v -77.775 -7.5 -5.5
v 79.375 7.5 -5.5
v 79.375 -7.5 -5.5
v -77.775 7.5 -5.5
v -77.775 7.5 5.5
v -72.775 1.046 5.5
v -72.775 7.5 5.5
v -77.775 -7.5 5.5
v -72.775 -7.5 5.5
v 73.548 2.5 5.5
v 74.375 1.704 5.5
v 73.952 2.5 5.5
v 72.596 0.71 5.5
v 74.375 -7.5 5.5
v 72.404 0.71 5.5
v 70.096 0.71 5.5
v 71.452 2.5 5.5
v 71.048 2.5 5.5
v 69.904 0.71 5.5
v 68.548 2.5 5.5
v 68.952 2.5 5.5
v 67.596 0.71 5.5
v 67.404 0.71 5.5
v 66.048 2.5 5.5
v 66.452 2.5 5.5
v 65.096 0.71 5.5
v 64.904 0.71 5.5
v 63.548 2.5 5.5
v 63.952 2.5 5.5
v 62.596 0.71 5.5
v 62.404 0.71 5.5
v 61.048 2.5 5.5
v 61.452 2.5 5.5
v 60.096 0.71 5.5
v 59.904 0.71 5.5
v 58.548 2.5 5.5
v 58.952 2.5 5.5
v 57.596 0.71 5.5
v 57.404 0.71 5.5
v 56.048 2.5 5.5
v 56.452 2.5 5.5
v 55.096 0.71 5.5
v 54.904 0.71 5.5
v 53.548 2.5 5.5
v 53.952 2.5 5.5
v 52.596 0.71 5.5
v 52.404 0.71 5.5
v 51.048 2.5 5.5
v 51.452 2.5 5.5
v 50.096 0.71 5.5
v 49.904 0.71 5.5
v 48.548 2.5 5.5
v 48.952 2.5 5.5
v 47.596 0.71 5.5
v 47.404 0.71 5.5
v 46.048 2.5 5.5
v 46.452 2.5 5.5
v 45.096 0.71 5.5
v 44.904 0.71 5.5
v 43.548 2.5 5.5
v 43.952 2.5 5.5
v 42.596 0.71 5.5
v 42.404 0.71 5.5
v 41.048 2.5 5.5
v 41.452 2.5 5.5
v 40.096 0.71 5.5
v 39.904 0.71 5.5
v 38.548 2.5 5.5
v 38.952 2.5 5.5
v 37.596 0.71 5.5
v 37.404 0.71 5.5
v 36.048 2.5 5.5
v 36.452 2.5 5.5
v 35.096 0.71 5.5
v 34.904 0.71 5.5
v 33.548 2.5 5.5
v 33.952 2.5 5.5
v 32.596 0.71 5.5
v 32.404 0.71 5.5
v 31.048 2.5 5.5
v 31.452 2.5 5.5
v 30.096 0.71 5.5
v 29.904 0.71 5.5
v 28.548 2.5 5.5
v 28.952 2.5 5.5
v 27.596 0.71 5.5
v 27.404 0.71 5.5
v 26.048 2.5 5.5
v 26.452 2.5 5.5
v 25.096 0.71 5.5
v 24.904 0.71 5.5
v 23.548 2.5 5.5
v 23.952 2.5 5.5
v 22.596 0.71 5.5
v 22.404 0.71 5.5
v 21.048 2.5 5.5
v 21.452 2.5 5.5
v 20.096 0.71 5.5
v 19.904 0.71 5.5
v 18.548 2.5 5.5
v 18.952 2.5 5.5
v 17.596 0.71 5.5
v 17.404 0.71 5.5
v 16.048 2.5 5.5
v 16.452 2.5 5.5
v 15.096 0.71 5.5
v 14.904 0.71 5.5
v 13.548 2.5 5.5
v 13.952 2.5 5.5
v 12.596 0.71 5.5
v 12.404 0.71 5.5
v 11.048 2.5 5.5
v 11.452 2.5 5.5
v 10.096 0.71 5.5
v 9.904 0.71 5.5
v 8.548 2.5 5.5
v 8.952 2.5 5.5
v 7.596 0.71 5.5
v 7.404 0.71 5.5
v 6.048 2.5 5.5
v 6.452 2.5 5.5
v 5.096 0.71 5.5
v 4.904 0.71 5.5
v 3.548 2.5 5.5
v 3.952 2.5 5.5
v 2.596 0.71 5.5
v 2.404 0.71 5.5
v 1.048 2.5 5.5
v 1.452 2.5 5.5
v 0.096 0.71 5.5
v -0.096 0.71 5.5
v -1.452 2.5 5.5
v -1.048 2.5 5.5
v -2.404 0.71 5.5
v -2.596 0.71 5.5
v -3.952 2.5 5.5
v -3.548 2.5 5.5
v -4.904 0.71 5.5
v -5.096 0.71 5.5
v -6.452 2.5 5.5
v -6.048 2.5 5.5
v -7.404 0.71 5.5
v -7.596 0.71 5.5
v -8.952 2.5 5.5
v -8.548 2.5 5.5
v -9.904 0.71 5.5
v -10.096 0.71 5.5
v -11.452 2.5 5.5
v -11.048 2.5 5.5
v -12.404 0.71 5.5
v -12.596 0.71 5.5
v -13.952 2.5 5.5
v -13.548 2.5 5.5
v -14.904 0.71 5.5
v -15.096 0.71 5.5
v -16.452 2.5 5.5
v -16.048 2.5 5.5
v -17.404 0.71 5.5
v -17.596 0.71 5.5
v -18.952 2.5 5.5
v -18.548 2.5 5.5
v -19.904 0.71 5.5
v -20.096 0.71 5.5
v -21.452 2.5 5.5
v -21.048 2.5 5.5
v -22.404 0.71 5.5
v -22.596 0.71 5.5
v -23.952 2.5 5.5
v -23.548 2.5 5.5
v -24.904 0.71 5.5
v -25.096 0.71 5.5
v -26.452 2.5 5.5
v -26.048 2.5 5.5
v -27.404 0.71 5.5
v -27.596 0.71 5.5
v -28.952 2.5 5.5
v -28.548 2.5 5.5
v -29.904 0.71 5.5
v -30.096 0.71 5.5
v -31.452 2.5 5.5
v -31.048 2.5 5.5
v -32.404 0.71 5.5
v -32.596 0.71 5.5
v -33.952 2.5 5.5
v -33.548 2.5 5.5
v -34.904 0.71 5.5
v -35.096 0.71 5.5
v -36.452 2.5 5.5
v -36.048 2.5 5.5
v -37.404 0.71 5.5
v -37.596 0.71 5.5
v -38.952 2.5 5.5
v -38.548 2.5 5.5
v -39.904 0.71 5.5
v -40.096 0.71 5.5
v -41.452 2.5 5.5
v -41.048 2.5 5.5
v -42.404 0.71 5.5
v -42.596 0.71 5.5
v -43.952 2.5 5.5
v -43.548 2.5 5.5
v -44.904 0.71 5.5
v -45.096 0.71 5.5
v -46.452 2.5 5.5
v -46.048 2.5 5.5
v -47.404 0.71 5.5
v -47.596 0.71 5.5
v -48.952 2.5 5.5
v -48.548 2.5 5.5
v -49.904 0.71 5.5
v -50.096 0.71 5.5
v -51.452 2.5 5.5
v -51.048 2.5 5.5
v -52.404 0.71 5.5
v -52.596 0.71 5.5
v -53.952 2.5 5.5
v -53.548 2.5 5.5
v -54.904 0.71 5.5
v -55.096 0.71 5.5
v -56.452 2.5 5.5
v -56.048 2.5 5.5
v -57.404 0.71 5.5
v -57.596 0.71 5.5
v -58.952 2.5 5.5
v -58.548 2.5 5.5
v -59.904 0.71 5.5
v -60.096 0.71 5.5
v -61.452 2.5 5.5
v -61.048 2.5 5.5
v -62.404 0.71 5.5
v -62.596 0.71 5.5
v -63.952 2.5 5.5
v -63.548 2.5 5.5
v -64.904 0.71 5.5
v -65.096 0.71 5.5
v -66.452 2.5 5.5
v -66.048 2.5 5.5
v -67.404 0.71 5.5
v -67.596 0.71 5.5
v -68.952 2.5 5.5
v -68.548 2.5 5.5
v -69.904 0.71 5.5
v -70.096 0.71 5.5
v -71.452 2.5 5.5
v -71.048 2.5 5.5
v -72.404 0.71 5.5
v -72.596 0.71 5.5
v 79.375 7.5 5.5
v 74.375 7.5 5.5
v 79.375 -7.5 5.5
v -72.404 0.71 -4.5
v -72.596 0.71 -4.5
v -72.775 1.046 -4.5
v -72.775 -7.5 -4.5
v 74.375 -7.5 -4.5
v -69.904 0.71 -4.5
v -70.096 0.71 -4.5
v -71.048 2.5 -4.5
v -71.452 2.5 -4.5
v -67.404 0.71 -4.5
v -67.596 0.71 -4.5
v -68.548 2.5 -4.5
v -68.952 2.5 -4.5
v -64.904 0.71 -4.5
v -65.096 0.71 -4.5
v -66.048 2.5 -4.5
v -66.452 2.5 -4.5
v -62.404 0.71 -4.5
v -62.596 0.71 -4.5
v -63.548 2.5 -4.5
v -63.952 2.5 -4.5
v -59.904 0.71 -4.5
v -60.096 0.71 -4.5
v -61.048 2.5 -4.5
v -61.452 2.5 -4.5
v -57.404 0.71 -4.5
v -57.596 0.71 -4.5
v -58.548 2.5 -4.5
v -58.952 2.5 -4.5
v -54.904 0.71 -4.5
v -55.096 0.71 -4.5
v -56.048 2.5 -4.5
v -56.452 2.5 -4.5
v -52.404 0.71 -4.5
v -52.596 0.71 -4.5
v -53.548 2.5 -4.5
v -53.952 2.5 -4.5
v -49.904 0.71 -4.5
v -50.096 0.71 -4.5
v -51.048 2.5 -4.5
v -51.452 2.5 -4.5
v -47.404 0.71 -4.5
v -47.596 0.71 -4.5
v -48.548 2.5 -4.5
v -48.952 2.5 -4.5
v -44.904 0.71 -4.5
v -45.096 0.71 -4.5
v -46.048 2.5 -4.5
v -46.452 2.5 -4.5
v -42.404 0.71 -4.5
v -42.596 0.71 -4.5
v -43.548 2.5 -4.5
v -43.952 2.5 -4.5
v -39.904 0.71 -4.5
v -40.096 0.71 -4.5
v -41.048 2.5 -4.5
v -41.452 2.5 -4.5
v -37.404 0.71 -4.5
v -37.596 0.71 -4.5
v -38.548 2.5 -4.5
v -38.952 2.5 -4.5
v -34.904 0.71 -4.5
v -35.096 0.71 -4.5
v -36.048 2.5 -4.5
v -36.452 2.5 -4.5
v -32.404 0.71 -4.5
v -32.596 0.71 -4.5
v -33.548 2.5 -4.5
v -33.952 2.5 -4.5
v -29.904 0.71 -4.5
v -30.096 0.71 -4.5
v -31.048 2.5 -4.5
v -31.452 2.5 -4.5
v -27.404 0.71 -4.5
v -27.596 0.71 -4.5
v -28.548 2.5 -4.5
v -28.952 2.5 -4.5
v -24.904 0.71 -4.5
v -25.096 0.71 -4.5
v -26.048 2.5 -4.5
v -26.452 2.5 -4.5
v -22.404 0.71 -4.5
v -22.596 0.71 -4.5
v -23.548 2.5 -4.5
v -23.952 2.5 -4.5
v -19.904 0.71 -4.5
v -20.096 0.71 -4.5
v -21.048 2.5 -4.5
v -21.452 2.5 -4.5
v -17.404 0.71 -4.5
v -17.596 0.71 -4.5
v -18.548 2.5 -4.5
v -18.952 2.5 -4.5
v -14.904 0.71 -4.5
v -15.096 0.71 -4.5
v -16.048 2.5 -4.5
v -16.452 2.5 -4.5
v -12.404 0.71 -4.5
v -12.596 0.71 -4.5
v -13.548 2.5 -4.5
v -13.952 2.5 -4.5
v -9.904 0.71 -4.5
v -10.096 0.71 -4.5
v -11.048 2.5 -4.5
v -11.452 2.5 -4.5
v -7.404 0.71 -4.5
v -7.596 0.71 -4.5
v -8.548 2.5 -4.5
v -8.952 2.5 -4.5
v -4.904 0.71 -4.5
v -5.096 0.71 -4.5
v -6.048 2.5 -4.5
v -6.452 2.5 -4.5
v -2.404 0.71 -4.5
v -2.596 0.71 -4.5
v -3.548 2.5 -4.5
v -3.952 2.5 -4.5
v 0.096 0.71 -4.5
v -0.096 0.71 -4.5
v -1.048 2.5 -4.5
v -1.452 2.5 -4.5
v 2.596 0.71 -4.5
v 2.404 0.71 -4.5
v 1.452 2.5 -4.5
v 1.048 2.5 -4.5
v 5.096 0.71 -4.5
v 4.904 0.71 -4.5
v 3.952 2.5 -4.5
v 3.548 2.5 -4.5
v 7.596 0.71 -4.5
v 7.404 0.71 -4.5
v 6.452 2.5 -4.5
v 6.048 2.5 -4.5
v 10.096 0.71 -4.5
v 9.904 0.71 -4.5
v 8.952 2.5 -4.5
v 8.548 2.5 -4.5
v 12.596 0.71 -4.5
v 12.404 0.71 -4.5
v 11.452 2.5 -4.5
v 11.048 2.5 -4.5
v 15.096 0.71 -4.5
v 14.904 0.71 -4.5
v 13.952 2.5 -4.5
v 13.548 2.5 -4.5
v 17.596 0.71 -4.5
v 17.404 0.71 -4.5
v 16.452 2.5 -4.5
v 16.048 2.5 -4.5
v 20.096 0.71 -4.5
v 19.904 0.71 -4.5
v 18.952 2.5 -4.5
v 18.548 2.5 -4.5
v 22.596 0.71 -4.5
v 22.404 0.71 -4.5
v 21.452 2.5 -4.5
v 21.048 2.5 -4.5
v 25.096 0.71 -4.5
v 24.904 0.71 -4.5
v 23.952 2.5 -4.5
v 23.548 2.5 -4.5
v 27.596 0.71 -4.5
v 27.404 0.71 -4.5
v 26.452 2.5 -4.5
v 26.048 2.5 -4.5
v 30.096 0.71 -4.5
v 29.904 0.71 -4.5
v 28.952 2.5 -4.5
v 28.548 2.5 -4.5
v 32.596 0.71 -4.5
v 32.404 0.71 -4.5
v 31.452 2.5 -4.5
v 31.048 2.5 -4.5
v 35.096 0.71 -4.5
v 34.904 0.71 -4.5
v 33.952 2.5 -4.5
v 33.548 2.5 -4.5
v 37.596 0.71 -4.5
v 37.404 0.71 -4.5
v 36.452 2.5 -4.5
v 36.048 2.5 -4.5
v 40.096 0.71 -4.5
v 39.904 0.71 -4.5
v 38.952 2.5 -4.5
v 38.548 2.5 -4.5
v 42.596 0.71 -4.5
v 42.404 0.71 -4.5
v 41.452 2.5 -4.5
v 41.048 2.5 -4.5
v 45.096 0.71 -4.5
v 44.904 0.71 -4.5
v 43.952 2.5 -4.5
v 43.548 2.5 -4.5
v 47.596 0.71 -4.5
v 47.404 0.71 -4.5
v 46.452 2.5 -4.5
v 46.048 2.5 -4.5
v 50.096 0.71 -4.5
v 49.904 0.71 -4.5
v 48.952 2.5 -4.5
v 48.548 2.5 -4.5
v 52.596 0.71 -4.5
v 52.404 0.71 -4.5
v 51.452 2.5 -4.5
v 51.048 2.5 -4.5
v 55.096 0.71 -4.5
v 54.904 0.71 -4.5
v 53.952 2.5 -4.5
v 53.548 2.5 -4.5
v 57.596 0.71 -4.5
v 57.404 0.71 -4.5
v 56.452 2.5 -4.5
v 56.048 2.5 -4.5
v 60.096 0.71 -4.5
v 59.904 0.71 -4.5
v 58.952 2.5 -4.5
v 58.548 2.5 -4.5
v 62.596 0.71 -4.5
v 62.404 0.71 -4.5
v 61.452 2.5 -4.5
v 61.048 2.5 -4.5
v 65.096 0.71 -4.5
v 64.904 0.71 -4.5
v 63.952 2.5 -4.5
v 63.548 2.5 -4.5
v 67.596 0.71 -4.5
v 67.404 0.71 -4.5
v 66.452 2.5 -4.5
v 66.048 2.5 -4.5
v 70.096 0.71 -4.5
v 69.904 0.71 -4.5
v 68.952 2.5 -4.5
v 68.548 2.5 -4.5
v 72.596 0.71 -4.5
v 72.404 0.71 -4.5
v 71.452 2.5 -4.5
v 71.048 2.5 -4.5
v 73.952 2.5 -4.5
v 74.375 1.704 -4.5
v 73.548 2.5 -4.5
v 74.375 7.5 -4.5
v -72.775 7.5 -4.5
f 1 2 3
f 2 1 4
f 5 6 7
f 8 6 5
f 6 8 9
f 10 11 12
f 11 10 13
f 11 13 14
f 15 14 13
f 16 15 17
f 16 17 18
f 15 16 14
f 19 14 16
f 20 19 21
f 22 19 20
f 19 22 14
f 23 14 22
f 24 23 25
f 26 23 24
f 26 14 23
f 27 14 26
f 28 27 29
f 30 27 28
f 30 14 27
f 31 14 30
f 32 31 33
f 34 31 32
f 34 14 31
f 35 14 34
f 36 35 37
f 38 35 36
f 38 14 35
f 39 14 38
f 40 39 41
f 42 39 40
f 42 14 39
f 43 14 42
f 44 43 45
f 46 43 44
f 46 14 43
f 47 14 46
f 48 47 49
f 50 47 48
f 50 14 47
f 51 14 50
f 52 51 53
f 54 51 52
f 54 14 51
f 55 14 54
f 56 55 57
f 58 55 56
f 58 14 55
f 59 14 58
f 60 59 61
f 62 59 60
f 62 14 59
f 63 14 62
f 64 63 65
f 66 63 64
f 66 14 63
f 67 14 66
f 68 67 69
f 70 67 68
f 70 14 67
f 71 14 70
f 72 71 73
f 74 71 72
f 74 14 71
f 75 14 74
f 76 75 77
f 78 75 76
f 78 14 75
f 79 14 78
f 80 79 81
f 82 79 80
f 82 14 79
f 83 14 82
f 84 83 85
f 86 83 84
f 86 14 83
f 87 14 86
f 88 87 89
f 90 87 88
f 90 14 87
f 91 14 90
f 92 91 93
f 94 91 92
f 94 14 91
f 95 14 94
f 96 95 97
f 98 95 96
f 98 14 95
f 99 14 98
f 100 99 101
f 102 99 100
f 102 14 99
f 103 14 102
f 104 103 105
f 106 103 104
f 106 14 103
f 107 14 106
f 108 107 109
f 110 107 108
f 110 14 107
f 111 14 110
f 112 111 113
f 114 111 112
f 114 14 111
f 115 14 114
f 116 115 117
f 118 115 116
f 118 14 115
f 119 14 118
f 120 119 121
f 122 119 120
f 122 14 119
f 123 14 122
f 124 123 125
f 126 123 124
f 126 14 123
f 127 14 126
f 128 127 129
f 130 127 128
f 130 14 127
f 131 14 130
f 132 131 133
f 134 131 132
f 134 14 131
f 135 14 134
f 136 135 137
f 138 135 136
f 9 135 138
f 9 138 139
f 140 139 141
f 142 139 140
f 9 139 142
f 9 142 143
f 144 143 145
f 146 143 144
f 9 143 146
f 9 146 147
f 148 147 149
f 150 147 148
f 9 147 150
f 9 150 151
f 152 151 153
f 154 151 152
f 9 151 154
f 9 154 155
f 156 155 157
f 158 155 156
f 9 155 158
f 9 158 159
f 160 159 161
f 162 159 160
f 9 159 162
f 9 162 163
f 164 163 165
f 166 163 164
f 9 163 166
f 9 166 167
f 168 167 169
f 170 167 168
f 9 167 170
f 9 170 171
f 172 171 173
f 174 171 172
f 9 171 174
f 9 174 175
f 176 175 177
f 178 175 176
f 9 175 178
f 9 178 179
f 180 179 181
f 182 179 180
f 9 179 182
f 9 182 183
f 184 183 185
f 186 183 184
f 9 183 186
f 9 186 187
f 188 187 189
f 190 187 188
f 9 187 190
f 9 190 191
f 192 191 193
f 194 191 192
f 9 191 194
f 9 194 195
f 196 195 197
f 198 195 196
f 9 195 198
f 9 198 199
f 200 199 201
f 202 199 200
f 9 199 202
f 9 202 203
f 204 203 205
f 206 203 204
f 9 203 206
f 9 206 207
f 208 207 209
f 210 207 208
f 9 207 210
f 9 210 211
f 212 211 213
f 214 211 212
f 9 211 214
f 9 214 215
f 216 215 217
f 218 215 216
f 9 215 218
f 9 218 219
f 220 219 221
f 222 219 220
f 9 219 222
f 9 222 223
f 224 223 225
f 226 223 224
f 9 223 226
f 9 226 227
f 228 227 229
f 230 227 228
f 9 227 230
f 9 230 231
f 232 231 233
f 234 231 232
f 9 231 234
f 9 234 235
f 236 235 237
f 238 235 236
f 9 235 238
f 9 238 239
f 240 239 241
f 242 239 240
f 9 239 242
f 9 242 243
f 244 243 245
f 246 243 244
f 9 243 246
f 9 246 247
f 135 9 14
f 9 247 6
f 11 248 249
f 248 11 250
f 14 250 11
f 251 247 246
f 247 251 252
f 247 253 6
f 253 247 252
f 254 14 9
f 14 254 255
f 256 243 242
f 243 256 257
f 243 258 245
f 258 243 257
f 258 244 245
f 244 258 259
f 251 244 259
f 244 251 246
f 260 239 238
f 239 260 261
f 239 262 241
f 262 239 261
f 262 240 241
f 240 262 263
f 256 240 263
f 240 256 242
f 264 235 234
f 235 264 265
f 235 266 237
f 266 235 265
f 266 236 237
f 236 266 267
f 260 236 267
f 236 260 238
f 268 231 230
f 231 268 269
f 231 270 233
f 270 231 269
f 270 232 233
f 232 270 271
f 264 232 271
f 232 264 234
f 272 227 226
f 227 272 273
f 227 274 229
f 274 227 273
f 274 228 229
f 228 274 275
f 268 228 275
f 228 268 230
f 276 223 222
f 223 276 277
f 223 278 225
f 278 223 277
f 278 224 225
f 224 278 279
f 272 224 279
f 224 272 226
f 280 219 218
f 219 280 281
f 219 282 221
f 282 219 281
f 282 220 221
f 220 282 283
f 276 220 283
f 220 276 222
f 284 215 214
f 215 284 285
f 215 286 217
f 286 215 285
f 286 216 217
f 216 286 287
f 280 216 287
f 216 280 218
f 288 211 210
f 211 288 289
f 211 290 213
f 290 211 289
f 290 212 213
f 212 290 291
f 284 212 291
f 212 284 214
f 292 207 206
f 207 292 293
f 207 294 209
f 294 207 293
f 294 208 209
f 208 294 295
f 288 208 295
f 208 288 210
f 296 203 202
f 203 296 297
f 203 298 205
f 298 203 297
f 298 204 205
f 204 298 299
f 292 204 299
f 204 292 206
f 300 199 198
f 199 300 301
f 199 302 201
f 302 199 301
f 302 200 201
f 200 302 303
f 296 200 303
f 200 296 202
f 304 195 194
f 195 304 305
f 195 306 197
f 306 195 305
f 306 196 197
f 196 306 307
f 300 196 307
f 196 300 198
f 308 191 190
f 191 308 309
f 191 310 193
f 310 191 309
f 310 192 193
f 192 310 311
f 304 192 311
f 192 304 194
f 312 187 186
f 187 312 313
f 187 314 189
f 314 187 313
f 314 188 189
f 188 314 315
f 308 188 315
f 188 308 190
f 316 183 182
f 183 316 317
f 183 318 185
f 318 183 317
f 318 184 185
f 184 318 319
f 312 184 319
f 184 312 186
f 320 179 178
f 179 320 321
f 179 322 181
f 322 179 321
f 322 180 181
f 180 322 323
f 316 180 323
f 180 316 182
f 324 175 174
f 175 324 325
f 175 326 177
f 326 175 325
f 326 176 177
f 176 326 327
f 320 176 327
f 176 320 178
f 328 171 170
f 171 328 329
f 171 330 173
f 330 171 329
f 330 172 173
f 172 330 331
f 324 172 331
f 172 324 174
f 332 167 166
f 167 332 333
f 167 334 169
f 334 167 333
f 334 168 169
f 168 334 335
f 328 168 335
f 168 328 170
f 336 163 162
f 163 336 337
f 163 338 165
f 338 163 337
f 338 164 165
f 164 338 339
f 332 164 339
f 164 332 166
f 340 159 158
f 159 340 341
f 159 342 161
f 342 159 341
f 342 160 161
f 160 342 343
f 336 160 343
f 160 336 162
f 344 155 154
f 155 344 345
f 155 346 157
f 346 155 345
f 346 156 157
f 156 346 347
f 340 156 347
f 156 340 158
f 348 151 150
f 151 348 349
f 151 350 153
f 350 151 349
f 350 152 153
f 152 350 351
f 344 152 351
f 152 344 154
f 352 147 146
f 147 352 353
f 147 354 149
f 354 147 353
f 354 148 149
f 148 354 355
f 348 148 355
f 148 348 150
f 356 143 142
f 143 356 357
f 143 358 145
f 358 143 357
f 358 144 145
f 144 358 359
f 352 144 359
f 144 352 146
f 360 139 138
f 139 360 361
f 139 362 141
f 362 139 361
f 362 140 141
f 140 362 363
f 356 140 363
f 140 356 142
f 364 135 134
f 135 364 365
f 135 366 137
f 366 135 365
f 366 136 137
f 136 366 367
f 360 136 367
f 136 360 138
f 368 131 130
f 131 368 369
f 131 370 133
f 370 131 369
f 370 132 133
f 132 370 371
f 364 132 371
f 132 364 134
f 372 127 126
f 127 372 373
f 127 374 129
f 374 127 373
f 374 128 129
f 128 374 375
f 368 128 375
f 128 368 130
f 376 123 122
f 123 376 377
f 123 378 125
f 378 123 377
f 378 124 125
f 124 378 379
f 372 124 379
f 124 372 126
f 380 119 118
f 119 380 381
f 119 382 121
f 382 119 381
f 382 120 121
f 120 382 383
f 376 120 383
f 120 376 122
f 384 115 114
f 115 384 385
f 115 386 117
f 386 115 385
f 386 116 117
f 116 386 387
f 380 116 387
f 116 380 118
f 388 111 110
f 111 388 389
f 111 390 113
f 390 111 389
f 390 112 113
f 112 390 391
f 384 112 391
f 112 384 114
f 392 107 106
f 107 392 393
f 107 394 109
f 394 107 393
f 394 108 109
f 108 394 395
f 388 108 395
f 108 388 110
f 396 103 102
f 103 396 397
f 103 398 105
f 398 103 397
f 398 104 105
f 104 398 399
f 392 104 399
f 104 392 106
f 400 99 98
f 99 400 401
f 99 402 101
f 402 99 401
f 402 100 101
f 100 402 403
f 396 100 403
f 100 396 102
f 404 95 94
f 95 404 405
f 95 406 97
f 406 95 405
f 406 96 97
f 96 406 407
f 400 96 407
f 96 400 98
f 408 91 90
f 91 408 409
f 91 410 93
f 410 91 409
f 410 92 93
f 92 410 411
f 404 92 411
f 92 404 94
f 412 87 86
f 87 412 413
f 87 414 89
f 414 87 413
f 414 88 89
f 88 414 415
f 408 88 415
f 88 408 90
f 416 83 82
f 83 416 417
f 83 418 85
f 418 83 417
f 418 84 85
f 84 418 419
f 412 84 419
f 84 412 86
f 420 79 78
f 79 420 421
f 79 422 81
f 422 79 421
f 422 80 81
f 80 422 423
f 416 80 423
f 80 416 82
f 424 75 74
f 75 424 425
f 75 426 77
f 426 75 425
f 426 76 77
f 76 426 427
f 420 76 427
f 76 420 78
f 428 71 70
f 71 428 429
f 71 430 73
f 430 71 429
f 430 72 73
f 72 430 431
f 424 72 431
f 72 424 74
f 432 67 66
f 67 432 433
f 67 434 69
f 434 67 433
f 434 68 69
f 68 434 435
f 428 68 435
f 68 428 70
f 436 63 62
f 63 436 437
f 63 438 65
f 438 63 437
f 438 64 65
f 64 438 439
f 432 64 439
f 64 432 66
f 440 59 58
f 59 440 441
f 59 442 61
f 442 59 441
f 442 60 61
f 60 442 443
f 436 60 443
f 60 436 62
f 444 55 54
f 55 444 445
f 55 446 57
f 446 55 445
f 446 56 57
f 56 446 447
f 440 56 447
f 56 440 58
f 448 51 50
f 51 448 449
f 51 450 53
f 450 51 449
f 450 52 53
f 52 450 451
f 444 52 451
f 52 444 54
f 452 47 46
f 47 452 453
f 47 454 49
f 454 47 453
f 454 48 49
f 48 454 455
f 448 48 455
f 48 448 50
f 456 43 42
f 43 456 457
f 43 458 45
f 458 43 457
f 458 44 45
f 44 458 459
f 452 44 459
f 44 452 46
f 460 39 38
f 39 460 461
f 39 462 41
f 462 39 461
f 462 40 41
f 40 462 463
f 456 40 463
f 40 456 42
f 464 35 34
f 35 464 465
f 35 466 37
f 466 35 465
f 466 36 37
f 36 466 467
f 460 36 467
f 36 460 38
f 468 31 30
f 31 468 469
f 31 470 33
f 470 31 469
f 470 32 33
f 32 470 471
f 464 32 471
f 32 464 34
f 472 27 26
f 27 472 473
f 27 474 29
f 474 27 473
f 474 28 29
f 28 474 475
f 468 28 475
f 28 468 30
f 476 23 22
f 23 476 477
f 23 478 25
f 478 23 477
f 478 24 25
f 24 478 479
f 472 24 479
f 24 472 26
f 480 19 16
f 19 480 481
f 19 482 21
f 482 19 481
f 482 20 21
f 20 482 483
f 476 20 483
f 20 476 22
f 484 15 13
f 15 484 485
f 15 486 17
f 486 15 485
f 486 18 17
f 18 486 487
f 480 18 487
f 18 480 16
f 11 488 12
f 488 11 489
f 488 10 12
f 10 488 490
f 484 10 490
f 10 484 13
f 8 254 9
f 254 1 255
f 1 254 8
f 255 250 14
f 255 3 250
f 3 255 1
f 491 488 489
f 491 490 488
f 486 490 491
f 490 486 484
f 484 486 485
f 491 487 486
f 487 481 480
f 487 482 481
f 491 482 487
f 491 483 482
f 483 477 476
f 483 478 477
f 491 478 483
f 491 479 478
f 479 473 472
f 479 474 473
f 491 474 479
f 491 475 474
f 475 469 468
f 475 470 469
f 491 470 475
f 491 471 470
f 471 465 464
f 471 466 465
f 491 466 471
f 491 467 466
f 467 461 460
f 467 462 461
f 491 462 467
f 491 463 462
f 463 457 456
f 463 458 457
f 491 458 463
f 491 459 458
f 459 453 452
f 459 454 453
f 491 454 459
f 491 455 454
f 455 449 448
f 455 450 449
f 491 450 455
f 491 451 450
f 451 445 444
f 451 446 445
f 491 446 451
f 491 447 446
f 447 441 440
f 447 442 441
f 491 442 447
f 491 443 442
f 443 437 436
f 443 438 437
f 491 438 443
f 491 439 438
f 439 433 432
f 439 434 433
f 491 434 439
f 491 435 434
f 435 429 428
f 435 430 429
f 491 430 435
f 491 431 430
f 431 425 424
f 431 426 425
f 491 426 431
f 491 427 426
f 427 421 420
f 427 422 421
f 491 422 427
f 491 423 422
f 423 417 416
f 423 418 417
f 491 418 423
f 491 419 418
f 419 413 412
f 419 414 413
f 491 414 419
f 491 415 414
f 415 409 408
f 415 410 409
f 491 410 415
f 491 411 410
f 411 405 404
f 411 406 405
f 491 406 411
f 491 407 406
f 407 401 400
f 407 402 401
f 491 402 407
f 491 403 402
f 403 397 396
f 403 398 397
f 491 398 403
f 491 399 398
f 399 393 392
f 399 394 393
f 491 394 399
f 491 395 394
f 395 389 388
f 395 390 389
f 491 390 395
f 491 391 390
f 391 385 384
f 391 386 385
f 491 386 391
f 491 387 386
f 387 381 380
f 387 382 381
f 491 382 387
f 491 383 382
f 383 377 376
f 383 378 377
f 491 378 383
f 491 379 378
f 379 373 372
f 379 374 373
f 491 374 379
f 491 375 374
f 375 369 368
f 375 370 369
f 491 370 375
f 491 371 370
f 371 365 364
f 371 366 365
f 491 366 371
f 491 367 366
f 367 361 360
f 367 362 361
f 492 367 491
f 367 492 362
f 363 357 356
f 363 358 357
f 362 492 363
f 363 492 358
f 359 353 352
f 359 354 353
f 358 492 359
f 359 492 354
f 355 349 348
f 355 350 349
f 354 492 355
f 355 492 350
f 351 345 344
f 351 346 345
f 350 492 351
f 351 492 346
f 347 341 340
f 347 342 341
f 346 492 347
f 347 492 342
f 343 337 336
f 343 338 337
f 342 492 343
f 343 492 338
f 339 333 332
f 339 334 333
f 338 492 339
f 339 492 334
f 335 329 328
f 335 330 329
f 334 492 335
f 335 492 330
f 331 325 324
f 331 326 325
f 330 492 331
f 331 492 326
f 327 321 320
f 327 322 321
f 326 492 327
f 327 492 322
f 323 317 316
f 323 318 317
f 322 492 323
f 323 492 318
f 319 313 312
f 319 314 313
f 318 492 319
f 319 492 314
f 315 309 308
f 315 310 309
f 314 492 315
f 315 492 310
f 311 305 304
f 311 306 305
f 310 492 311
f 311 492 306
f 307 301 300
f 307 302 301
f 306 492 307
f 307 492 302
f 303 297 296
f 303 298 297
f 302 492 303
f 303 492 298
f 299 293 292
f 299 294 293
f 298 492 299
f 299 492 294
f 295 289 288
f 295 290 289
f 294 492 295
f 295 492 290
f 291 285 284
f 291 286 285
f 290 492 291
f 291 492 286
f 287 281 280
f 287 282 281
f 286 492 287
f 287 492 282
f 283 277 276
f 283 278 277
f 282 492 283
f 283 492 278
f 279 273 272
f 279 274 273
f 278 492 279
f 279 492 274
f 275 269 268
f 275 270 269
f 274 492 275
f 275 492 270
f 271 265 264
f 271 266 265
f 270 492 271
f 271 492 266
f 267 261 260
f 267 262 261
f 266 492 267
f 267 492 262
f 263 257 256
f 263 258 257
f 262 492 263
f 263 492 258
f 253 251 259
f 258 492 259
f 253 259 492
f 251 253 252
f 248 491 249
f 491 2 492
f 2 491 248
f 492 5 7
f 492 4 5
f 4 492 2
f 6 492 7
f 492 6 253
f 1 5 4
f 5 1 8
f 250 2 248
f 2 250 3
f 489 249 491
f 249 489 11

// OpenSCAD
//This is a modification of " Public Domain Parametric Involute Spur Gear (and involute helical gear and involute rack)
// by Leemon Baird, 2011, Leemon@Leemon.com
//http://www.thingiverse.com/thing:5505  "

//Modifications by racatack June 2016:
// v1.0, 6/24/16:
//  -Incorporated 'module InvoluteGear_rack()' from the 11/11/15 comment by quisam2342 in thing:5505 to fix noted problems in rack generation at various tooth sizes
//  -Added a section for an optional 'backboard' that can be used to stiffen an otherwise skinny rack
//  -Added sections for optional Stop Blocks at either or both ends of a rack
//  -Removed extra gears from the example since I only need one pinion. See thing:5505 example section to gain more insight into gear generation.
//v1.1, 6/28/16:
//  -Added sections to optionally create mounting flanges on the bottom/backside of the rack. Flanges can be at either or both ends, or longitudinal.

//TO GENERATE A CUSTOM RACK AND PINION ENTER INPUTS AT LINES 345-377


//////////////////////////////////////////////////////////////////////////////////////////////
// Public Domain Parametric Involute Spur Gear (and involute helical gear and involute rack)
// version 1.1
// by Leemon Baird, 2011, Leemon@Leemon.com
//http://www.thingiverse.com/thing:5505
//
// This file is public domain.  Use it for any purpose, including commercial
// applications.  Attribution would be nice, but is not required.  There is
// no warranty of any kind, including its correctness, usefulness, or safety.
// 
// This is parameterized involute spur (or helical) gear.  It is much simpler and less powerful than
// others on Thingiverse.  But it is public domain.  I implemented it from scratch from the 
// descriptions and equations on Wikipedia and the web, using Mathematica for calculations and testing,
// and I now release it into the public domain.
//
//		http://en.wikipedia.org/wiki/Involute_gear
//		http://en.wikipedia.org/wiki/Gear
//		http://en.wikipedia.org/wiki/List_of_gear_nomenclature
//		http://gtrebaol.free.fr/doc/catia/spur_gear.html
//		http://www.cs.cmu.edu/~rapidproto/mechanisms/chpt7.html
//
// The module gear() gives an involute spur gear, with reasonable defaults for all the parameters.
// Normally, you should just choose the first 4 parameters, and let the rest be default values.
// The module gear() gives a gear in the XY plane, centered on the origin, with one tooth centered on
// the positive Y axis.  The various functions below it take the same parameters, and return various
// measurements for the gear.  The most important is pitch_radius, which tells how far apart to space
// gears that are meshing, and adendum_radius, which gives the size of the region filled by the gear.
// A gear has a "pitch circle", which is an invisible circle that cuts through the middle of each
// tooth (though not the exact center). In order for two gears to mesh, their pitch circles should 
// just touch.  So the distance between their centers should be pitch_radius() for one, plus pitch_radius() 
// for the other, which gives the radii of their pitch circles.
//
// In order for two gears to mesh, they must have the same mm_per_tooth and pressure_angle parameters.  
// mm_per_tooth gives the number of millimeters of arc around the pitch circle covered by one tooth and one
// space between teeth.  The pitch angle controls how flat or bulged the sides of the teeth are.  Common
// values include 14.5 degrees and 20 degrees, and occasionally 25.  Though I've seen 28 recommended for
// plastic gears. Larger numbers bulge out more, giving stronger teeth, so 28 degrees is the default here.
//
// The ratio of number_of_teeth for two meshing gears gives how many times one will make a full 
// revolution when the the other makes one full revolution.  If the two numbers are coprime (i.e. 
// are not both divisible by the same number greater than 1), then every tooth on one gear
// will meet every tooth on the other, for more even wear.  So coprime numbers of teeth are good.
//
// The module rack() gives a rack, which is a bar with teeth.  A rack can mesh with any
// gear that has the same mm_per_tooth and pressure_angle.
//
// Some terminology: 
// The outline of a gear is a smooth circle (the "pitch circle") which has mountains and valleys
// added so it is toothed.  So there is an inner circle (the "root circle") that touches the 
// base of all the teeth, an outer circle that touches the tips of all the teeth,
// and the invisible pitch circle in between them.  There is also a "base circle", which can be smaller than
// all three of the others, which controls the shape of the teeth.  The side of each tooth lies on the path 
// that the end of a string would follow if it were wrapped tightly around the base circle, then slowly unwound.  
// That shape is an "involute", which gives this type of gear its name.
//
//////////////////////////////////////////////////////////////////////////////////////////////

//An involute spur gear, with reasonable defaults for all the parameters.
//Normally, you should just choose the first 4 parameters, and let the rest be default values.
//Meshing gears must match in mm_per_tooth, pressure_angle, and twist,
//and be separated by the sum of their pitch radii, which can be found with pitch_radius().
module gear (
	mm_per_tooth    = 3,    //this is the "circular pitch", the circumference of the pitch circle divided by the number of teeth
	number_of_teeth = 11,   //total number of teeth around the entire perimeter
	thickness       = 6,    //thickness of gear in mm
	hole_diameter   = 3,    //diameter of the hole in the center, in mm
	twist           = 0,    //teeth rotate this many degrees from bottom of gear to top.  360 makes the gear a screw with each thread going around once
	teeth_to_hide   = 0,    //number of teeth to delete to make this only a fraction of a circle
	pressure_angle  = 28,   //Controls how straight or bulged the tooth sides are. In degrees.
	clearance       = 0.0,  //gap between top of a tooth on one gear and bottom of valley on a meshing gear (in millimeters)
	backlash        = 0.0   //gap between two meshing teeth, in the direction along the circumference of the pitch circle
) {
	assign(pi = 3.1415926)
	assign(p  = mm_per_tooth * number_of_teeth / pi / 2)  //radius of pitch circle
	assign(c  = p + mm_per_tooth / pi - clearance)        //radius of outer circle
	assign(b  = p*cos(pressure_angle))                    //radius of base circle
	assign(r  = p-(c-p)-clearance)                        //radius of root circle
	assign(t  = mm_per_tooth/2-backlash/2)                //tooth thickness at pitch circle
	assign(k  = -iang(b, p) - t/2/p/pi*180) {             //angle to where involute meets base circle on each side of tooth
		difference() {
			for (i = [0:number_of_teeth-teeth_to_hide-1] )
				rotate([0,0,i*360/number_of_teeth])
					linear_extrude(height = thickness, center = true, convexity = 10, twist = twist)
						polygon(
							points=[
								[0, -hole_diameter/10],
								polar(r, -181/number_of_teeth),
								polar(r, r<b ? k : -180/number_of_teeth),
								q7(0/5,r,b,c,k, 1),q7(1/5,r,b,c,k, 1),q7(2/5,r,b,c,k, 1),q7(3/5,r,b,c,k, 1),q7(4/5,r,b,c,k, 1),q7(5/5,r,b,c,k, 1),
								q7(5/5,r,b,c,k,-1),q7(4/5,r,b,c,k,-1),q7(3/5,r,b,c,k,-1),q7(2/5,r,b,c,k,-1),q7(1/5,r,b,c,k,-1),q7(0/5,r,b,c,k,-1),
								polar(r, r<b ? -k : 180/number_of_teeth),
								polar(r, 181/number_of_teeth)
							],
 							paths=[[0,1,2,3,4,5,6,7,8,9,10,11,12,13,14,15,16]]
						);
			cylinder(h=2*thickness+1, r=hole_diameter/2, center=true, $fn=20);
		}
	}
};	
//these 4 functions are used by gear
function polar(r,theta)   = r*[sin(theta), cos(theta)];                            //convert polar to cartesian coordinates
function iang(r1,r2)      = sqrt((r2/r1)*(r2/r1) - 1)/3.1415926*180 - acos(r1/r2); //unwind a string this many degrees to go from radius r1 to radius r2
function q7(f,r,b,r2,t,s) = q6(b,s,t,(1-f)*max(b,r)+f*r2);                         //radius a fraction f up the curved side of the tooth 
function q6(b,s,t,d)      = polar(d,s*(iang(b,d)+t));                              //point at radius d on the involute curve

//a rack, which is a straight line with teeth (the same as a segment from a giant gear with a huge number of teeth).
//The "pitch circle" is a line along the X axis.
//module rack (
//	mm_per_tooth    = 3,    //this is the "circular pitch", the circumference of the pitch circle divided by the number //of teeth
//	number_of_teeth = 11,   //total number of teeth along the rack
//	thickness       = 6,    //thickness of rack in mm (affects each tooth)
//	height          = 120,   //height of rack in mm, from tooth top to far side of rack.
//	pressure_angle  = 28,   //Controls how straight or bulged the tooth sides are. In degrees.
//	backlash        = 0.0   //gap between two meshing teeth, in the direction along the circumference of the pitch circle
//) {
//	assign(pi = 3.1415926)
//	assign(a = mm_per_tooth / pi) //addendum
//	assign(t = a*cos(pressure_angle)-1)         //tooth side is tilted so top/bottom corners move this amount
//		for (i = [0:number_of_teeth-1] )
//			translate([i*mm_per_tooth,0,0])
//				linear_extrude(height = thickness, center = true, convexity = 10)
//					polygon(
//						points=[
//							[-mm_per_tooth * 3/4,                 a-height],
//							[-mm_per_tooth * 3/4 - backlash,     -a],
//							[-mm_per_tooth * 1/4 + backlash - t, -a],
//							[-mm_per_tooth * 1/4 + backlash + t,  a],
//							[ mm_per_tooth * 1/4 - backlash - t,  a],
//							[ mm_per_tooth * 1/4 - backlash + t, -a],
//							[ mm_per_tooth * 3/4 + backlash,     -a],
//							[ mm_per_tooth * 3/4,                 a-height],
//						],
//						paths=[[0,1,2,3,4,5,6,7]]
//					);
//};	


  //rac note - This section generates the rack body and teeth. It is from the 11/11/15 comment by quisam2342 in thing:5505 to fix noted problems with rack generation, and replaces the original 'module rack()'
////////////////////////////////////////////////////////////////////////////////////////////////
// The module InvoluteGear_rack() gives a involute gear rack, which is a bar with teeth.
// A rack can mesh with any gear that has the same mm_per_tooth and pressure_angle.
// The "pitch circle" is a line along the X axis.
//
// mm_per_tooth     this is the "circular pitch", the circumference of the pitch circle
//                  divided by the number of teeth
//
// number_of_teeth  total number of teeth along the rack
//
// thickness        thickness of rack in mm
//
// height           height of rack in mm, from tooth top to far side of rack
//
// pressure_angle   controls how straight or bulged the tooth sides are, in degrees
//
// clearance        gap between top of a tooth on one gear and bottom of valley
//                  on a meshing gear, in millimeters
//
// backlash         gap between two meshing teeth, in the direction along the circumference
//                  of the pitch circle
////////////////////////////////////////////////////////////////////////////////////////////////



module InvoluteGear_rack (

   //Default numbers in this section get overridden by numbers in 'example rack and pinion' section, so set your values there.
   
    mm_per_tooth    = 3, //all meshing gears need the same mm_per_tooth 
    number_of_teeth = 11,
    thickness       = 6,
    height          = 4,
    
  //rac - Added variables for backboard, stop blocks and mounting flanges: 
 //set your values in the 'example rack and pinion' section, as defaults given here will be overridden by that section 
    backboard_thickness = 2.0,
    backboard_height = 1.0,
    side_flange_thickness = 0,
    side_flange_height = 0,
    flange_offset = 0, 
    stop_height = backboard_height,
    left_stop_enable = 1, 
    right_stop_enable = 1,
    flange_height = 0,
    left_flange_enable = 1, 
    right_flange_enable = 1,
    
//These defaults are not redefined in the example section:
    pressure_angle  = 28,  //all meshing gears need the same pressure_angle
    clearance       = 0.0,
    backlash        = 0.0

)

{
    // addendum - tooth height above pitch line
    assign(addendum =        module_value(mm_per_tooth) - clearance)

    // dedendum - tooth height below pitch line
    assign(dedendum = 1.25 * module_value(mm_per_tooth)            ) 


    for (i = [0:number_of_teeth-1] )
        translate([(i+0.5)*mm_per_tooth,height-addendum,0])
            linear_extrude(height = thickness, center = true, convexity = 10)  //'height' parameter here is not the same as 'height' parameter of module. Here it effectively is the width or thickness as the rack is extruded from one side-face to the other.
                polygon(
                    points=[
                        [-1/2 * mm_per_tooth,                                              addendum-height],
                        [-1/2 * mm_per_tooth,                                             -dedendum],
                        [-1/4 * mm_per_tooth + backlash - dedendum * tan(pressure_angle), -dedendum],
                        [-1/4 * mm_per_tooth + backlash + addendum * tan(pressure_angle),  addendum],
                        [ 1/4 * mm_per_tooth - backlash - addendum * tan(pressure_angle),  addendum],
                        [ 1/4 * mm_per_tooth - backlash + dedendum * tan(pressure_angle), -dedendum],
                        [ 1/2 * mm_per_tooth,                                             -dedendum],
                        [ 1/2 * mm_per_tooth,                                              addendum-height],
                    ],
                    paths=[[0,1,2,3,4,5,6,7]]
                );

   //rac -added - This section optionally creates a 'stop block' at the left end of the rack
            translate([(-0.11)*mm_per_tooth,0,0.5*(-thickness)])  
            linear_extrude(height = left_stop_enable*thickness, center = false, convexity = 10)
                polygon(
                    points=[
                        [-mm_per_tooth,height+stop_height],   //stop_height extends stop block above teeth, change the number to change the extension amount
                        [-mm_per_tooth,0],
                        [ mm_per_tooth,0],
                        [ mm_per_tooth,height+stop_height],   //stop_height extends stop block above teeth, change the number to change the extension amount
                    ],
                    paths=[[0,1,2,3]]
                );


    //rac -added - This section optionally creates a 'stop block' at the right end of the rack
            translate([(0.75+number_of_teeth)*mm_per_tooth,0,0.5*(-thickness)])  
            linear_extrude(height = right_stop_enable*thickness, center = false, convexity = 10)
                polygon(
                    points=[
                        [-mm_per_tooth,height+stop_height],   //stop_height extends stop block above teeth
                        [-mm_per_tooth,0],
                        [ mm_per_tooth,0],
                        [ mm_per_tooth,height+stop_height],   //stop_height extends stop block above teeth
                    ],
                    paths=[[0,1,2,3]]
                );


    //rac -added - This section optionally creates a flange at the left rear of the rack
            translate([(-0.75)*mm_per_tooth,0,0.5*(-thickness)])   
            linear_extrude(height = left_flange_enable*thickness, center = false, convexity = 10)
                polygon(
                    points=[
                        [-1/2 * mm_per_tooth,-flange_height],   //flange_height extends flange beyond rack bottom
                        [-1/2 * mm_per_tooth,0],
                        [ 1/2 * mm_per_tooth,0],
                        [ 1/2 * mm_per_tooth,-flange_height],   //flange_height extends flange beyond rack bottom
                    ],
                    paths=[[0,1,2,3]]
                );



    //rac -added - This section optionally creates a flange at the right rear of the rack
            translate([(0.11+number_of_teeth)*mm_per_tooth,0,0.5*(-thickness)])  
            linear_extrude(height = right_flange_enable*thickness, center = false, convexity = 10)
                polygon(
                    points=[
                        [-1/2 * mm_per_tooth,-flange_height],   //flange_height extends flange beyond rack bottom
                        [-1/2 * mm_per_tooth,0],
                        [ 1/2 * mm_per_tooth,0],
                        [ 1/2 * mm_per_tooth,-flange_height],   //flange_height extends flange beyond rack bottom
                    ],
                    paths=[[0,1,2,3]]
                );



    //rac -added - This section optionally creates a 'Backboard' on one side of the rack. Can be used to add stiffness for a 'thin' rack (i.e. a rack with low height and/or thickness numbers) or if a large negative height is used it can extend under the rack as a mounting flange.
    for (i = [0:number_of_teeth-1] )
        translate([(i+0.5)*mm_per_tooth,0,0.5*(-thickness+backboard_thickness)])    
        //0.5*(-thickness+backboard_thickness) starts the backboard at one side of the rack and extrudes it inward
            linear_extrude(height = backboard_thickness, center = true, convexity = 10)
                polygon(
                    points=[
                        [-1/2 * mm_per_tooth,height+backboard_height],   //backboard_height extends backboard above teeth
                        [-1/2 * mm_per_tooth,0],

                        [ 1/2 * mm_per_tooth,0],
                        [ 1/2 * mm_per_tooth,height+backboard_height],   //backboard_height extends backboard above teeth
                    ],
                    paths=[[0,1,2,3]]
                );


    //rac -added - This section optionally creates a Rear Side-Flange on along one side of the rack. Can be used to add stiffness for a 'thin' rack (i.e. a rack with low height and/or thickness numbers) or it can be used as a mounting flange.
    for (i = [0:number_of_teeth-1] )
        translate([(i+0.5)*mm_per_tooth,0,0.5*(-thickness+side_flange_thickness)+flange_offset])    
        //0.5*(-side_flange_thickness) starts the backboard at one side of the rack and extrudes it inward. flange_offset moves the flange toward the other side of the rack
            linear_extrude(height = side_flange_thickness, center = true, convexity = 10)
                polygon(
                    points=[
                        [-1/2 * mm_per_tooth,-side_flange_height],   //side_flange_height extends side_flange beyond rack bottom
                        [-1/2 * mm_per_tooth,0],

                        [ 1/2 * mm_per_tooth,0],
                        [ 1/2 * mm_per_tooth,-side_flange_height],   //side_flange_height extends backboard beyond rack bottom
                    ],
                    paths=[[0,1,2,3]]
                );

}


//These 5 functions let the user find the derived dimensions of the gear.
//A gear fits within a circle of radius outer_radius, and two gears should have
//their centers separated by the sum of their pictch_radius.
function circular_pitch  (mm_per_tooth=3) = mm_per_tooth;                     //tooth density expressed as "circular pitch" in millimeters
function diametral_pitch (mm_per_tooth=3) = 3.1415926 / mm_per_tooth;         //tooth density expressed as "diametral pitch" in teeth per millimeter
function module_value    (mm_per_tooth=3) = mm_per_tooth / 3.1415926;                //tooth density expressed as "module" or "modulus" in millimeters
function pitch_radius    (mm_per_tooth=3,number_of_teeth=11) = mm_per_tooth * number_of_teeth / 3.1415926 / 2;
function outer_radius    (mm_per_tooth=3,number_of_teeth=11,clearance=0.1)    //The gear fits entirely within a cylinder of this radius.
	= mm_per_tooth*(1+number_of_teeth/2)/3.1415926  - clearance;              





//////////////////////////////////////////////////////////////////////////////////////////////

//GENERATE A RACK AND PINION 
//ENTER YOUR VALUES HERE: (not in defaults of InvoluteGear_rack() or gear() modules)

//The variable names can be confusing - experiment! Change something then click the dotted cube with Fast-Forward arrows.

//example rack and pinion:
//all distances in mm
n1 = 40; //red gear number of teeth. Set to zero if you don't want to print a pinion.
n5 = 60;  //gray rack number of teeth.  Set to 1 if you don't want to print a rack- that's as small as it gets (you'll get 2 teeth if you set it to zero... I haven't tried to determine why that happens)
mm_per_tooth = 2.5;
thickness    = 11;  // depth of the rack from side-to-side, including backboard if any. The pinion will be this depth minus the backboard_thickness
hole         = 0;   //hole diameter in pinion gear
height       = 10;  // distance from bottom of the rack to the tips of the teeth

//rac-Added - Set your values here for  a Backboard along one side of the teeth.
backboard_thickness = 1.0; //set to zero for no backboard
    backboard_height = 5;   //set to zero for top of backboard to be even with tips of teeth, a positive number will extend above the teeth by the chosen amount. Negative number will place the top of the backboard lower than the teeth.

//rac-Added - Set your values here for a rear Side-Flange along one side of the teeth extending to the rear of the rack (opposite the direction of a backboard).
side_flange_thickness = 0; //set to zero for no rear Side-Flange
    side_flange_height = 10; // A positive number extends the side-flange beyond the bottom of the rack the by specified amount.
    flange_offset = 0; //Set to zero for a flange running coplanar with one side of the teeth. A positive number moves the flange toward other side of the teeth

//rac-Added - Set your values here for Stop Blocks at one or both ends.
stop_height = 5; //Stop Blocks will extend this much above the teeth. A positive number will extend above the teeth by the chosen amount. Negative number will place the top of the block lower than the teeth. 
    left_stop_enable = 1;  //set to 1 to generate Left Stop Block, set to 0 to disable
    right_stop_enable = 1;  //set to 1 to generate Right Stop Block, set to 0 to disable

//rac-Added - Set your values here for rear End-Flanges at one or both ends.    
flange_height = 2.25; //Flanges will extend this much from the bottom of the rack. ****Combine with 0 height Stop Blocks to effectively start flanges at top of tooth instead of backside.****
    left_flange_enable = 0;  //set to 1 to generate Left Rear Flange, set to 0 to disable. 
    right_flange_enable = 0;  //set to 1 to generate Right Rear Flange, set to 0 to disable.
//end of inputs -------------------------------------------------------

d1 =pitch_radius(mm_per_tooth,n1);

//Generation of pinion gear:
//translate([ 0,    0, -.5*backboard_thickness])
//rotate([0,0, $t*360/n1])
//color([1.00,0.75,0.75])
//gear(mm_per_tooth,n1,(thickness-backboard_thickness),hole); //rac -RE above: 'thickness-backboard_thickness' is used here to reduce gear thickness for backboard on rack, The '-.5*backboard_thickness' in translate puts gear bottom even with rack bottom

//Generation of rack, and Relative positioning of gear and rack:
//translate([(-floor(n5/2)-floor(n1/2)+$t+n1/2-1/2), -height-backboard_height-d1-mm_per_tooth, 0])
//rotate([0,0,0])
//color([0.75,0.75,0.75])
translate([(-(n5/2)*mm_per_tooth), -(height+backboard_height)/2, 0])
InvoluteGear_rack(mm_per_tooth,n5,thickness,height,backboard_thickness,backboard_height,side_flange_thickness,side_flange_height,flange_offset,stop_height,left_stop_enable,right_stop_enable,flange_height,left_flange_enable,right_flange_enable);   //rac - In the above 'translate' instruction, the middle parameter sets spacing between the rack and the pinion. I've set it to '-height-backboard_height-d1-mm_per_tooth' to give a proportionate offset that allows for ease of printing for most sets of gear & rack parameters. If you use a large NEGATIVE backboard height THE GEAR AND RACK MAY OVERLAP. That can be fixed by substituting some other number/formula for '-height-backboard_height-d1-mm_per_tooth'. Try for example -3*d1, or just subtract an additional fixed offset from what's in there now (e.g. (-height-backboard_height-d1-mm_per_tooth)-14.)

//end of example rack and pinion 
//////////////////////////////////////////////////////////////////////////////////////////////////
